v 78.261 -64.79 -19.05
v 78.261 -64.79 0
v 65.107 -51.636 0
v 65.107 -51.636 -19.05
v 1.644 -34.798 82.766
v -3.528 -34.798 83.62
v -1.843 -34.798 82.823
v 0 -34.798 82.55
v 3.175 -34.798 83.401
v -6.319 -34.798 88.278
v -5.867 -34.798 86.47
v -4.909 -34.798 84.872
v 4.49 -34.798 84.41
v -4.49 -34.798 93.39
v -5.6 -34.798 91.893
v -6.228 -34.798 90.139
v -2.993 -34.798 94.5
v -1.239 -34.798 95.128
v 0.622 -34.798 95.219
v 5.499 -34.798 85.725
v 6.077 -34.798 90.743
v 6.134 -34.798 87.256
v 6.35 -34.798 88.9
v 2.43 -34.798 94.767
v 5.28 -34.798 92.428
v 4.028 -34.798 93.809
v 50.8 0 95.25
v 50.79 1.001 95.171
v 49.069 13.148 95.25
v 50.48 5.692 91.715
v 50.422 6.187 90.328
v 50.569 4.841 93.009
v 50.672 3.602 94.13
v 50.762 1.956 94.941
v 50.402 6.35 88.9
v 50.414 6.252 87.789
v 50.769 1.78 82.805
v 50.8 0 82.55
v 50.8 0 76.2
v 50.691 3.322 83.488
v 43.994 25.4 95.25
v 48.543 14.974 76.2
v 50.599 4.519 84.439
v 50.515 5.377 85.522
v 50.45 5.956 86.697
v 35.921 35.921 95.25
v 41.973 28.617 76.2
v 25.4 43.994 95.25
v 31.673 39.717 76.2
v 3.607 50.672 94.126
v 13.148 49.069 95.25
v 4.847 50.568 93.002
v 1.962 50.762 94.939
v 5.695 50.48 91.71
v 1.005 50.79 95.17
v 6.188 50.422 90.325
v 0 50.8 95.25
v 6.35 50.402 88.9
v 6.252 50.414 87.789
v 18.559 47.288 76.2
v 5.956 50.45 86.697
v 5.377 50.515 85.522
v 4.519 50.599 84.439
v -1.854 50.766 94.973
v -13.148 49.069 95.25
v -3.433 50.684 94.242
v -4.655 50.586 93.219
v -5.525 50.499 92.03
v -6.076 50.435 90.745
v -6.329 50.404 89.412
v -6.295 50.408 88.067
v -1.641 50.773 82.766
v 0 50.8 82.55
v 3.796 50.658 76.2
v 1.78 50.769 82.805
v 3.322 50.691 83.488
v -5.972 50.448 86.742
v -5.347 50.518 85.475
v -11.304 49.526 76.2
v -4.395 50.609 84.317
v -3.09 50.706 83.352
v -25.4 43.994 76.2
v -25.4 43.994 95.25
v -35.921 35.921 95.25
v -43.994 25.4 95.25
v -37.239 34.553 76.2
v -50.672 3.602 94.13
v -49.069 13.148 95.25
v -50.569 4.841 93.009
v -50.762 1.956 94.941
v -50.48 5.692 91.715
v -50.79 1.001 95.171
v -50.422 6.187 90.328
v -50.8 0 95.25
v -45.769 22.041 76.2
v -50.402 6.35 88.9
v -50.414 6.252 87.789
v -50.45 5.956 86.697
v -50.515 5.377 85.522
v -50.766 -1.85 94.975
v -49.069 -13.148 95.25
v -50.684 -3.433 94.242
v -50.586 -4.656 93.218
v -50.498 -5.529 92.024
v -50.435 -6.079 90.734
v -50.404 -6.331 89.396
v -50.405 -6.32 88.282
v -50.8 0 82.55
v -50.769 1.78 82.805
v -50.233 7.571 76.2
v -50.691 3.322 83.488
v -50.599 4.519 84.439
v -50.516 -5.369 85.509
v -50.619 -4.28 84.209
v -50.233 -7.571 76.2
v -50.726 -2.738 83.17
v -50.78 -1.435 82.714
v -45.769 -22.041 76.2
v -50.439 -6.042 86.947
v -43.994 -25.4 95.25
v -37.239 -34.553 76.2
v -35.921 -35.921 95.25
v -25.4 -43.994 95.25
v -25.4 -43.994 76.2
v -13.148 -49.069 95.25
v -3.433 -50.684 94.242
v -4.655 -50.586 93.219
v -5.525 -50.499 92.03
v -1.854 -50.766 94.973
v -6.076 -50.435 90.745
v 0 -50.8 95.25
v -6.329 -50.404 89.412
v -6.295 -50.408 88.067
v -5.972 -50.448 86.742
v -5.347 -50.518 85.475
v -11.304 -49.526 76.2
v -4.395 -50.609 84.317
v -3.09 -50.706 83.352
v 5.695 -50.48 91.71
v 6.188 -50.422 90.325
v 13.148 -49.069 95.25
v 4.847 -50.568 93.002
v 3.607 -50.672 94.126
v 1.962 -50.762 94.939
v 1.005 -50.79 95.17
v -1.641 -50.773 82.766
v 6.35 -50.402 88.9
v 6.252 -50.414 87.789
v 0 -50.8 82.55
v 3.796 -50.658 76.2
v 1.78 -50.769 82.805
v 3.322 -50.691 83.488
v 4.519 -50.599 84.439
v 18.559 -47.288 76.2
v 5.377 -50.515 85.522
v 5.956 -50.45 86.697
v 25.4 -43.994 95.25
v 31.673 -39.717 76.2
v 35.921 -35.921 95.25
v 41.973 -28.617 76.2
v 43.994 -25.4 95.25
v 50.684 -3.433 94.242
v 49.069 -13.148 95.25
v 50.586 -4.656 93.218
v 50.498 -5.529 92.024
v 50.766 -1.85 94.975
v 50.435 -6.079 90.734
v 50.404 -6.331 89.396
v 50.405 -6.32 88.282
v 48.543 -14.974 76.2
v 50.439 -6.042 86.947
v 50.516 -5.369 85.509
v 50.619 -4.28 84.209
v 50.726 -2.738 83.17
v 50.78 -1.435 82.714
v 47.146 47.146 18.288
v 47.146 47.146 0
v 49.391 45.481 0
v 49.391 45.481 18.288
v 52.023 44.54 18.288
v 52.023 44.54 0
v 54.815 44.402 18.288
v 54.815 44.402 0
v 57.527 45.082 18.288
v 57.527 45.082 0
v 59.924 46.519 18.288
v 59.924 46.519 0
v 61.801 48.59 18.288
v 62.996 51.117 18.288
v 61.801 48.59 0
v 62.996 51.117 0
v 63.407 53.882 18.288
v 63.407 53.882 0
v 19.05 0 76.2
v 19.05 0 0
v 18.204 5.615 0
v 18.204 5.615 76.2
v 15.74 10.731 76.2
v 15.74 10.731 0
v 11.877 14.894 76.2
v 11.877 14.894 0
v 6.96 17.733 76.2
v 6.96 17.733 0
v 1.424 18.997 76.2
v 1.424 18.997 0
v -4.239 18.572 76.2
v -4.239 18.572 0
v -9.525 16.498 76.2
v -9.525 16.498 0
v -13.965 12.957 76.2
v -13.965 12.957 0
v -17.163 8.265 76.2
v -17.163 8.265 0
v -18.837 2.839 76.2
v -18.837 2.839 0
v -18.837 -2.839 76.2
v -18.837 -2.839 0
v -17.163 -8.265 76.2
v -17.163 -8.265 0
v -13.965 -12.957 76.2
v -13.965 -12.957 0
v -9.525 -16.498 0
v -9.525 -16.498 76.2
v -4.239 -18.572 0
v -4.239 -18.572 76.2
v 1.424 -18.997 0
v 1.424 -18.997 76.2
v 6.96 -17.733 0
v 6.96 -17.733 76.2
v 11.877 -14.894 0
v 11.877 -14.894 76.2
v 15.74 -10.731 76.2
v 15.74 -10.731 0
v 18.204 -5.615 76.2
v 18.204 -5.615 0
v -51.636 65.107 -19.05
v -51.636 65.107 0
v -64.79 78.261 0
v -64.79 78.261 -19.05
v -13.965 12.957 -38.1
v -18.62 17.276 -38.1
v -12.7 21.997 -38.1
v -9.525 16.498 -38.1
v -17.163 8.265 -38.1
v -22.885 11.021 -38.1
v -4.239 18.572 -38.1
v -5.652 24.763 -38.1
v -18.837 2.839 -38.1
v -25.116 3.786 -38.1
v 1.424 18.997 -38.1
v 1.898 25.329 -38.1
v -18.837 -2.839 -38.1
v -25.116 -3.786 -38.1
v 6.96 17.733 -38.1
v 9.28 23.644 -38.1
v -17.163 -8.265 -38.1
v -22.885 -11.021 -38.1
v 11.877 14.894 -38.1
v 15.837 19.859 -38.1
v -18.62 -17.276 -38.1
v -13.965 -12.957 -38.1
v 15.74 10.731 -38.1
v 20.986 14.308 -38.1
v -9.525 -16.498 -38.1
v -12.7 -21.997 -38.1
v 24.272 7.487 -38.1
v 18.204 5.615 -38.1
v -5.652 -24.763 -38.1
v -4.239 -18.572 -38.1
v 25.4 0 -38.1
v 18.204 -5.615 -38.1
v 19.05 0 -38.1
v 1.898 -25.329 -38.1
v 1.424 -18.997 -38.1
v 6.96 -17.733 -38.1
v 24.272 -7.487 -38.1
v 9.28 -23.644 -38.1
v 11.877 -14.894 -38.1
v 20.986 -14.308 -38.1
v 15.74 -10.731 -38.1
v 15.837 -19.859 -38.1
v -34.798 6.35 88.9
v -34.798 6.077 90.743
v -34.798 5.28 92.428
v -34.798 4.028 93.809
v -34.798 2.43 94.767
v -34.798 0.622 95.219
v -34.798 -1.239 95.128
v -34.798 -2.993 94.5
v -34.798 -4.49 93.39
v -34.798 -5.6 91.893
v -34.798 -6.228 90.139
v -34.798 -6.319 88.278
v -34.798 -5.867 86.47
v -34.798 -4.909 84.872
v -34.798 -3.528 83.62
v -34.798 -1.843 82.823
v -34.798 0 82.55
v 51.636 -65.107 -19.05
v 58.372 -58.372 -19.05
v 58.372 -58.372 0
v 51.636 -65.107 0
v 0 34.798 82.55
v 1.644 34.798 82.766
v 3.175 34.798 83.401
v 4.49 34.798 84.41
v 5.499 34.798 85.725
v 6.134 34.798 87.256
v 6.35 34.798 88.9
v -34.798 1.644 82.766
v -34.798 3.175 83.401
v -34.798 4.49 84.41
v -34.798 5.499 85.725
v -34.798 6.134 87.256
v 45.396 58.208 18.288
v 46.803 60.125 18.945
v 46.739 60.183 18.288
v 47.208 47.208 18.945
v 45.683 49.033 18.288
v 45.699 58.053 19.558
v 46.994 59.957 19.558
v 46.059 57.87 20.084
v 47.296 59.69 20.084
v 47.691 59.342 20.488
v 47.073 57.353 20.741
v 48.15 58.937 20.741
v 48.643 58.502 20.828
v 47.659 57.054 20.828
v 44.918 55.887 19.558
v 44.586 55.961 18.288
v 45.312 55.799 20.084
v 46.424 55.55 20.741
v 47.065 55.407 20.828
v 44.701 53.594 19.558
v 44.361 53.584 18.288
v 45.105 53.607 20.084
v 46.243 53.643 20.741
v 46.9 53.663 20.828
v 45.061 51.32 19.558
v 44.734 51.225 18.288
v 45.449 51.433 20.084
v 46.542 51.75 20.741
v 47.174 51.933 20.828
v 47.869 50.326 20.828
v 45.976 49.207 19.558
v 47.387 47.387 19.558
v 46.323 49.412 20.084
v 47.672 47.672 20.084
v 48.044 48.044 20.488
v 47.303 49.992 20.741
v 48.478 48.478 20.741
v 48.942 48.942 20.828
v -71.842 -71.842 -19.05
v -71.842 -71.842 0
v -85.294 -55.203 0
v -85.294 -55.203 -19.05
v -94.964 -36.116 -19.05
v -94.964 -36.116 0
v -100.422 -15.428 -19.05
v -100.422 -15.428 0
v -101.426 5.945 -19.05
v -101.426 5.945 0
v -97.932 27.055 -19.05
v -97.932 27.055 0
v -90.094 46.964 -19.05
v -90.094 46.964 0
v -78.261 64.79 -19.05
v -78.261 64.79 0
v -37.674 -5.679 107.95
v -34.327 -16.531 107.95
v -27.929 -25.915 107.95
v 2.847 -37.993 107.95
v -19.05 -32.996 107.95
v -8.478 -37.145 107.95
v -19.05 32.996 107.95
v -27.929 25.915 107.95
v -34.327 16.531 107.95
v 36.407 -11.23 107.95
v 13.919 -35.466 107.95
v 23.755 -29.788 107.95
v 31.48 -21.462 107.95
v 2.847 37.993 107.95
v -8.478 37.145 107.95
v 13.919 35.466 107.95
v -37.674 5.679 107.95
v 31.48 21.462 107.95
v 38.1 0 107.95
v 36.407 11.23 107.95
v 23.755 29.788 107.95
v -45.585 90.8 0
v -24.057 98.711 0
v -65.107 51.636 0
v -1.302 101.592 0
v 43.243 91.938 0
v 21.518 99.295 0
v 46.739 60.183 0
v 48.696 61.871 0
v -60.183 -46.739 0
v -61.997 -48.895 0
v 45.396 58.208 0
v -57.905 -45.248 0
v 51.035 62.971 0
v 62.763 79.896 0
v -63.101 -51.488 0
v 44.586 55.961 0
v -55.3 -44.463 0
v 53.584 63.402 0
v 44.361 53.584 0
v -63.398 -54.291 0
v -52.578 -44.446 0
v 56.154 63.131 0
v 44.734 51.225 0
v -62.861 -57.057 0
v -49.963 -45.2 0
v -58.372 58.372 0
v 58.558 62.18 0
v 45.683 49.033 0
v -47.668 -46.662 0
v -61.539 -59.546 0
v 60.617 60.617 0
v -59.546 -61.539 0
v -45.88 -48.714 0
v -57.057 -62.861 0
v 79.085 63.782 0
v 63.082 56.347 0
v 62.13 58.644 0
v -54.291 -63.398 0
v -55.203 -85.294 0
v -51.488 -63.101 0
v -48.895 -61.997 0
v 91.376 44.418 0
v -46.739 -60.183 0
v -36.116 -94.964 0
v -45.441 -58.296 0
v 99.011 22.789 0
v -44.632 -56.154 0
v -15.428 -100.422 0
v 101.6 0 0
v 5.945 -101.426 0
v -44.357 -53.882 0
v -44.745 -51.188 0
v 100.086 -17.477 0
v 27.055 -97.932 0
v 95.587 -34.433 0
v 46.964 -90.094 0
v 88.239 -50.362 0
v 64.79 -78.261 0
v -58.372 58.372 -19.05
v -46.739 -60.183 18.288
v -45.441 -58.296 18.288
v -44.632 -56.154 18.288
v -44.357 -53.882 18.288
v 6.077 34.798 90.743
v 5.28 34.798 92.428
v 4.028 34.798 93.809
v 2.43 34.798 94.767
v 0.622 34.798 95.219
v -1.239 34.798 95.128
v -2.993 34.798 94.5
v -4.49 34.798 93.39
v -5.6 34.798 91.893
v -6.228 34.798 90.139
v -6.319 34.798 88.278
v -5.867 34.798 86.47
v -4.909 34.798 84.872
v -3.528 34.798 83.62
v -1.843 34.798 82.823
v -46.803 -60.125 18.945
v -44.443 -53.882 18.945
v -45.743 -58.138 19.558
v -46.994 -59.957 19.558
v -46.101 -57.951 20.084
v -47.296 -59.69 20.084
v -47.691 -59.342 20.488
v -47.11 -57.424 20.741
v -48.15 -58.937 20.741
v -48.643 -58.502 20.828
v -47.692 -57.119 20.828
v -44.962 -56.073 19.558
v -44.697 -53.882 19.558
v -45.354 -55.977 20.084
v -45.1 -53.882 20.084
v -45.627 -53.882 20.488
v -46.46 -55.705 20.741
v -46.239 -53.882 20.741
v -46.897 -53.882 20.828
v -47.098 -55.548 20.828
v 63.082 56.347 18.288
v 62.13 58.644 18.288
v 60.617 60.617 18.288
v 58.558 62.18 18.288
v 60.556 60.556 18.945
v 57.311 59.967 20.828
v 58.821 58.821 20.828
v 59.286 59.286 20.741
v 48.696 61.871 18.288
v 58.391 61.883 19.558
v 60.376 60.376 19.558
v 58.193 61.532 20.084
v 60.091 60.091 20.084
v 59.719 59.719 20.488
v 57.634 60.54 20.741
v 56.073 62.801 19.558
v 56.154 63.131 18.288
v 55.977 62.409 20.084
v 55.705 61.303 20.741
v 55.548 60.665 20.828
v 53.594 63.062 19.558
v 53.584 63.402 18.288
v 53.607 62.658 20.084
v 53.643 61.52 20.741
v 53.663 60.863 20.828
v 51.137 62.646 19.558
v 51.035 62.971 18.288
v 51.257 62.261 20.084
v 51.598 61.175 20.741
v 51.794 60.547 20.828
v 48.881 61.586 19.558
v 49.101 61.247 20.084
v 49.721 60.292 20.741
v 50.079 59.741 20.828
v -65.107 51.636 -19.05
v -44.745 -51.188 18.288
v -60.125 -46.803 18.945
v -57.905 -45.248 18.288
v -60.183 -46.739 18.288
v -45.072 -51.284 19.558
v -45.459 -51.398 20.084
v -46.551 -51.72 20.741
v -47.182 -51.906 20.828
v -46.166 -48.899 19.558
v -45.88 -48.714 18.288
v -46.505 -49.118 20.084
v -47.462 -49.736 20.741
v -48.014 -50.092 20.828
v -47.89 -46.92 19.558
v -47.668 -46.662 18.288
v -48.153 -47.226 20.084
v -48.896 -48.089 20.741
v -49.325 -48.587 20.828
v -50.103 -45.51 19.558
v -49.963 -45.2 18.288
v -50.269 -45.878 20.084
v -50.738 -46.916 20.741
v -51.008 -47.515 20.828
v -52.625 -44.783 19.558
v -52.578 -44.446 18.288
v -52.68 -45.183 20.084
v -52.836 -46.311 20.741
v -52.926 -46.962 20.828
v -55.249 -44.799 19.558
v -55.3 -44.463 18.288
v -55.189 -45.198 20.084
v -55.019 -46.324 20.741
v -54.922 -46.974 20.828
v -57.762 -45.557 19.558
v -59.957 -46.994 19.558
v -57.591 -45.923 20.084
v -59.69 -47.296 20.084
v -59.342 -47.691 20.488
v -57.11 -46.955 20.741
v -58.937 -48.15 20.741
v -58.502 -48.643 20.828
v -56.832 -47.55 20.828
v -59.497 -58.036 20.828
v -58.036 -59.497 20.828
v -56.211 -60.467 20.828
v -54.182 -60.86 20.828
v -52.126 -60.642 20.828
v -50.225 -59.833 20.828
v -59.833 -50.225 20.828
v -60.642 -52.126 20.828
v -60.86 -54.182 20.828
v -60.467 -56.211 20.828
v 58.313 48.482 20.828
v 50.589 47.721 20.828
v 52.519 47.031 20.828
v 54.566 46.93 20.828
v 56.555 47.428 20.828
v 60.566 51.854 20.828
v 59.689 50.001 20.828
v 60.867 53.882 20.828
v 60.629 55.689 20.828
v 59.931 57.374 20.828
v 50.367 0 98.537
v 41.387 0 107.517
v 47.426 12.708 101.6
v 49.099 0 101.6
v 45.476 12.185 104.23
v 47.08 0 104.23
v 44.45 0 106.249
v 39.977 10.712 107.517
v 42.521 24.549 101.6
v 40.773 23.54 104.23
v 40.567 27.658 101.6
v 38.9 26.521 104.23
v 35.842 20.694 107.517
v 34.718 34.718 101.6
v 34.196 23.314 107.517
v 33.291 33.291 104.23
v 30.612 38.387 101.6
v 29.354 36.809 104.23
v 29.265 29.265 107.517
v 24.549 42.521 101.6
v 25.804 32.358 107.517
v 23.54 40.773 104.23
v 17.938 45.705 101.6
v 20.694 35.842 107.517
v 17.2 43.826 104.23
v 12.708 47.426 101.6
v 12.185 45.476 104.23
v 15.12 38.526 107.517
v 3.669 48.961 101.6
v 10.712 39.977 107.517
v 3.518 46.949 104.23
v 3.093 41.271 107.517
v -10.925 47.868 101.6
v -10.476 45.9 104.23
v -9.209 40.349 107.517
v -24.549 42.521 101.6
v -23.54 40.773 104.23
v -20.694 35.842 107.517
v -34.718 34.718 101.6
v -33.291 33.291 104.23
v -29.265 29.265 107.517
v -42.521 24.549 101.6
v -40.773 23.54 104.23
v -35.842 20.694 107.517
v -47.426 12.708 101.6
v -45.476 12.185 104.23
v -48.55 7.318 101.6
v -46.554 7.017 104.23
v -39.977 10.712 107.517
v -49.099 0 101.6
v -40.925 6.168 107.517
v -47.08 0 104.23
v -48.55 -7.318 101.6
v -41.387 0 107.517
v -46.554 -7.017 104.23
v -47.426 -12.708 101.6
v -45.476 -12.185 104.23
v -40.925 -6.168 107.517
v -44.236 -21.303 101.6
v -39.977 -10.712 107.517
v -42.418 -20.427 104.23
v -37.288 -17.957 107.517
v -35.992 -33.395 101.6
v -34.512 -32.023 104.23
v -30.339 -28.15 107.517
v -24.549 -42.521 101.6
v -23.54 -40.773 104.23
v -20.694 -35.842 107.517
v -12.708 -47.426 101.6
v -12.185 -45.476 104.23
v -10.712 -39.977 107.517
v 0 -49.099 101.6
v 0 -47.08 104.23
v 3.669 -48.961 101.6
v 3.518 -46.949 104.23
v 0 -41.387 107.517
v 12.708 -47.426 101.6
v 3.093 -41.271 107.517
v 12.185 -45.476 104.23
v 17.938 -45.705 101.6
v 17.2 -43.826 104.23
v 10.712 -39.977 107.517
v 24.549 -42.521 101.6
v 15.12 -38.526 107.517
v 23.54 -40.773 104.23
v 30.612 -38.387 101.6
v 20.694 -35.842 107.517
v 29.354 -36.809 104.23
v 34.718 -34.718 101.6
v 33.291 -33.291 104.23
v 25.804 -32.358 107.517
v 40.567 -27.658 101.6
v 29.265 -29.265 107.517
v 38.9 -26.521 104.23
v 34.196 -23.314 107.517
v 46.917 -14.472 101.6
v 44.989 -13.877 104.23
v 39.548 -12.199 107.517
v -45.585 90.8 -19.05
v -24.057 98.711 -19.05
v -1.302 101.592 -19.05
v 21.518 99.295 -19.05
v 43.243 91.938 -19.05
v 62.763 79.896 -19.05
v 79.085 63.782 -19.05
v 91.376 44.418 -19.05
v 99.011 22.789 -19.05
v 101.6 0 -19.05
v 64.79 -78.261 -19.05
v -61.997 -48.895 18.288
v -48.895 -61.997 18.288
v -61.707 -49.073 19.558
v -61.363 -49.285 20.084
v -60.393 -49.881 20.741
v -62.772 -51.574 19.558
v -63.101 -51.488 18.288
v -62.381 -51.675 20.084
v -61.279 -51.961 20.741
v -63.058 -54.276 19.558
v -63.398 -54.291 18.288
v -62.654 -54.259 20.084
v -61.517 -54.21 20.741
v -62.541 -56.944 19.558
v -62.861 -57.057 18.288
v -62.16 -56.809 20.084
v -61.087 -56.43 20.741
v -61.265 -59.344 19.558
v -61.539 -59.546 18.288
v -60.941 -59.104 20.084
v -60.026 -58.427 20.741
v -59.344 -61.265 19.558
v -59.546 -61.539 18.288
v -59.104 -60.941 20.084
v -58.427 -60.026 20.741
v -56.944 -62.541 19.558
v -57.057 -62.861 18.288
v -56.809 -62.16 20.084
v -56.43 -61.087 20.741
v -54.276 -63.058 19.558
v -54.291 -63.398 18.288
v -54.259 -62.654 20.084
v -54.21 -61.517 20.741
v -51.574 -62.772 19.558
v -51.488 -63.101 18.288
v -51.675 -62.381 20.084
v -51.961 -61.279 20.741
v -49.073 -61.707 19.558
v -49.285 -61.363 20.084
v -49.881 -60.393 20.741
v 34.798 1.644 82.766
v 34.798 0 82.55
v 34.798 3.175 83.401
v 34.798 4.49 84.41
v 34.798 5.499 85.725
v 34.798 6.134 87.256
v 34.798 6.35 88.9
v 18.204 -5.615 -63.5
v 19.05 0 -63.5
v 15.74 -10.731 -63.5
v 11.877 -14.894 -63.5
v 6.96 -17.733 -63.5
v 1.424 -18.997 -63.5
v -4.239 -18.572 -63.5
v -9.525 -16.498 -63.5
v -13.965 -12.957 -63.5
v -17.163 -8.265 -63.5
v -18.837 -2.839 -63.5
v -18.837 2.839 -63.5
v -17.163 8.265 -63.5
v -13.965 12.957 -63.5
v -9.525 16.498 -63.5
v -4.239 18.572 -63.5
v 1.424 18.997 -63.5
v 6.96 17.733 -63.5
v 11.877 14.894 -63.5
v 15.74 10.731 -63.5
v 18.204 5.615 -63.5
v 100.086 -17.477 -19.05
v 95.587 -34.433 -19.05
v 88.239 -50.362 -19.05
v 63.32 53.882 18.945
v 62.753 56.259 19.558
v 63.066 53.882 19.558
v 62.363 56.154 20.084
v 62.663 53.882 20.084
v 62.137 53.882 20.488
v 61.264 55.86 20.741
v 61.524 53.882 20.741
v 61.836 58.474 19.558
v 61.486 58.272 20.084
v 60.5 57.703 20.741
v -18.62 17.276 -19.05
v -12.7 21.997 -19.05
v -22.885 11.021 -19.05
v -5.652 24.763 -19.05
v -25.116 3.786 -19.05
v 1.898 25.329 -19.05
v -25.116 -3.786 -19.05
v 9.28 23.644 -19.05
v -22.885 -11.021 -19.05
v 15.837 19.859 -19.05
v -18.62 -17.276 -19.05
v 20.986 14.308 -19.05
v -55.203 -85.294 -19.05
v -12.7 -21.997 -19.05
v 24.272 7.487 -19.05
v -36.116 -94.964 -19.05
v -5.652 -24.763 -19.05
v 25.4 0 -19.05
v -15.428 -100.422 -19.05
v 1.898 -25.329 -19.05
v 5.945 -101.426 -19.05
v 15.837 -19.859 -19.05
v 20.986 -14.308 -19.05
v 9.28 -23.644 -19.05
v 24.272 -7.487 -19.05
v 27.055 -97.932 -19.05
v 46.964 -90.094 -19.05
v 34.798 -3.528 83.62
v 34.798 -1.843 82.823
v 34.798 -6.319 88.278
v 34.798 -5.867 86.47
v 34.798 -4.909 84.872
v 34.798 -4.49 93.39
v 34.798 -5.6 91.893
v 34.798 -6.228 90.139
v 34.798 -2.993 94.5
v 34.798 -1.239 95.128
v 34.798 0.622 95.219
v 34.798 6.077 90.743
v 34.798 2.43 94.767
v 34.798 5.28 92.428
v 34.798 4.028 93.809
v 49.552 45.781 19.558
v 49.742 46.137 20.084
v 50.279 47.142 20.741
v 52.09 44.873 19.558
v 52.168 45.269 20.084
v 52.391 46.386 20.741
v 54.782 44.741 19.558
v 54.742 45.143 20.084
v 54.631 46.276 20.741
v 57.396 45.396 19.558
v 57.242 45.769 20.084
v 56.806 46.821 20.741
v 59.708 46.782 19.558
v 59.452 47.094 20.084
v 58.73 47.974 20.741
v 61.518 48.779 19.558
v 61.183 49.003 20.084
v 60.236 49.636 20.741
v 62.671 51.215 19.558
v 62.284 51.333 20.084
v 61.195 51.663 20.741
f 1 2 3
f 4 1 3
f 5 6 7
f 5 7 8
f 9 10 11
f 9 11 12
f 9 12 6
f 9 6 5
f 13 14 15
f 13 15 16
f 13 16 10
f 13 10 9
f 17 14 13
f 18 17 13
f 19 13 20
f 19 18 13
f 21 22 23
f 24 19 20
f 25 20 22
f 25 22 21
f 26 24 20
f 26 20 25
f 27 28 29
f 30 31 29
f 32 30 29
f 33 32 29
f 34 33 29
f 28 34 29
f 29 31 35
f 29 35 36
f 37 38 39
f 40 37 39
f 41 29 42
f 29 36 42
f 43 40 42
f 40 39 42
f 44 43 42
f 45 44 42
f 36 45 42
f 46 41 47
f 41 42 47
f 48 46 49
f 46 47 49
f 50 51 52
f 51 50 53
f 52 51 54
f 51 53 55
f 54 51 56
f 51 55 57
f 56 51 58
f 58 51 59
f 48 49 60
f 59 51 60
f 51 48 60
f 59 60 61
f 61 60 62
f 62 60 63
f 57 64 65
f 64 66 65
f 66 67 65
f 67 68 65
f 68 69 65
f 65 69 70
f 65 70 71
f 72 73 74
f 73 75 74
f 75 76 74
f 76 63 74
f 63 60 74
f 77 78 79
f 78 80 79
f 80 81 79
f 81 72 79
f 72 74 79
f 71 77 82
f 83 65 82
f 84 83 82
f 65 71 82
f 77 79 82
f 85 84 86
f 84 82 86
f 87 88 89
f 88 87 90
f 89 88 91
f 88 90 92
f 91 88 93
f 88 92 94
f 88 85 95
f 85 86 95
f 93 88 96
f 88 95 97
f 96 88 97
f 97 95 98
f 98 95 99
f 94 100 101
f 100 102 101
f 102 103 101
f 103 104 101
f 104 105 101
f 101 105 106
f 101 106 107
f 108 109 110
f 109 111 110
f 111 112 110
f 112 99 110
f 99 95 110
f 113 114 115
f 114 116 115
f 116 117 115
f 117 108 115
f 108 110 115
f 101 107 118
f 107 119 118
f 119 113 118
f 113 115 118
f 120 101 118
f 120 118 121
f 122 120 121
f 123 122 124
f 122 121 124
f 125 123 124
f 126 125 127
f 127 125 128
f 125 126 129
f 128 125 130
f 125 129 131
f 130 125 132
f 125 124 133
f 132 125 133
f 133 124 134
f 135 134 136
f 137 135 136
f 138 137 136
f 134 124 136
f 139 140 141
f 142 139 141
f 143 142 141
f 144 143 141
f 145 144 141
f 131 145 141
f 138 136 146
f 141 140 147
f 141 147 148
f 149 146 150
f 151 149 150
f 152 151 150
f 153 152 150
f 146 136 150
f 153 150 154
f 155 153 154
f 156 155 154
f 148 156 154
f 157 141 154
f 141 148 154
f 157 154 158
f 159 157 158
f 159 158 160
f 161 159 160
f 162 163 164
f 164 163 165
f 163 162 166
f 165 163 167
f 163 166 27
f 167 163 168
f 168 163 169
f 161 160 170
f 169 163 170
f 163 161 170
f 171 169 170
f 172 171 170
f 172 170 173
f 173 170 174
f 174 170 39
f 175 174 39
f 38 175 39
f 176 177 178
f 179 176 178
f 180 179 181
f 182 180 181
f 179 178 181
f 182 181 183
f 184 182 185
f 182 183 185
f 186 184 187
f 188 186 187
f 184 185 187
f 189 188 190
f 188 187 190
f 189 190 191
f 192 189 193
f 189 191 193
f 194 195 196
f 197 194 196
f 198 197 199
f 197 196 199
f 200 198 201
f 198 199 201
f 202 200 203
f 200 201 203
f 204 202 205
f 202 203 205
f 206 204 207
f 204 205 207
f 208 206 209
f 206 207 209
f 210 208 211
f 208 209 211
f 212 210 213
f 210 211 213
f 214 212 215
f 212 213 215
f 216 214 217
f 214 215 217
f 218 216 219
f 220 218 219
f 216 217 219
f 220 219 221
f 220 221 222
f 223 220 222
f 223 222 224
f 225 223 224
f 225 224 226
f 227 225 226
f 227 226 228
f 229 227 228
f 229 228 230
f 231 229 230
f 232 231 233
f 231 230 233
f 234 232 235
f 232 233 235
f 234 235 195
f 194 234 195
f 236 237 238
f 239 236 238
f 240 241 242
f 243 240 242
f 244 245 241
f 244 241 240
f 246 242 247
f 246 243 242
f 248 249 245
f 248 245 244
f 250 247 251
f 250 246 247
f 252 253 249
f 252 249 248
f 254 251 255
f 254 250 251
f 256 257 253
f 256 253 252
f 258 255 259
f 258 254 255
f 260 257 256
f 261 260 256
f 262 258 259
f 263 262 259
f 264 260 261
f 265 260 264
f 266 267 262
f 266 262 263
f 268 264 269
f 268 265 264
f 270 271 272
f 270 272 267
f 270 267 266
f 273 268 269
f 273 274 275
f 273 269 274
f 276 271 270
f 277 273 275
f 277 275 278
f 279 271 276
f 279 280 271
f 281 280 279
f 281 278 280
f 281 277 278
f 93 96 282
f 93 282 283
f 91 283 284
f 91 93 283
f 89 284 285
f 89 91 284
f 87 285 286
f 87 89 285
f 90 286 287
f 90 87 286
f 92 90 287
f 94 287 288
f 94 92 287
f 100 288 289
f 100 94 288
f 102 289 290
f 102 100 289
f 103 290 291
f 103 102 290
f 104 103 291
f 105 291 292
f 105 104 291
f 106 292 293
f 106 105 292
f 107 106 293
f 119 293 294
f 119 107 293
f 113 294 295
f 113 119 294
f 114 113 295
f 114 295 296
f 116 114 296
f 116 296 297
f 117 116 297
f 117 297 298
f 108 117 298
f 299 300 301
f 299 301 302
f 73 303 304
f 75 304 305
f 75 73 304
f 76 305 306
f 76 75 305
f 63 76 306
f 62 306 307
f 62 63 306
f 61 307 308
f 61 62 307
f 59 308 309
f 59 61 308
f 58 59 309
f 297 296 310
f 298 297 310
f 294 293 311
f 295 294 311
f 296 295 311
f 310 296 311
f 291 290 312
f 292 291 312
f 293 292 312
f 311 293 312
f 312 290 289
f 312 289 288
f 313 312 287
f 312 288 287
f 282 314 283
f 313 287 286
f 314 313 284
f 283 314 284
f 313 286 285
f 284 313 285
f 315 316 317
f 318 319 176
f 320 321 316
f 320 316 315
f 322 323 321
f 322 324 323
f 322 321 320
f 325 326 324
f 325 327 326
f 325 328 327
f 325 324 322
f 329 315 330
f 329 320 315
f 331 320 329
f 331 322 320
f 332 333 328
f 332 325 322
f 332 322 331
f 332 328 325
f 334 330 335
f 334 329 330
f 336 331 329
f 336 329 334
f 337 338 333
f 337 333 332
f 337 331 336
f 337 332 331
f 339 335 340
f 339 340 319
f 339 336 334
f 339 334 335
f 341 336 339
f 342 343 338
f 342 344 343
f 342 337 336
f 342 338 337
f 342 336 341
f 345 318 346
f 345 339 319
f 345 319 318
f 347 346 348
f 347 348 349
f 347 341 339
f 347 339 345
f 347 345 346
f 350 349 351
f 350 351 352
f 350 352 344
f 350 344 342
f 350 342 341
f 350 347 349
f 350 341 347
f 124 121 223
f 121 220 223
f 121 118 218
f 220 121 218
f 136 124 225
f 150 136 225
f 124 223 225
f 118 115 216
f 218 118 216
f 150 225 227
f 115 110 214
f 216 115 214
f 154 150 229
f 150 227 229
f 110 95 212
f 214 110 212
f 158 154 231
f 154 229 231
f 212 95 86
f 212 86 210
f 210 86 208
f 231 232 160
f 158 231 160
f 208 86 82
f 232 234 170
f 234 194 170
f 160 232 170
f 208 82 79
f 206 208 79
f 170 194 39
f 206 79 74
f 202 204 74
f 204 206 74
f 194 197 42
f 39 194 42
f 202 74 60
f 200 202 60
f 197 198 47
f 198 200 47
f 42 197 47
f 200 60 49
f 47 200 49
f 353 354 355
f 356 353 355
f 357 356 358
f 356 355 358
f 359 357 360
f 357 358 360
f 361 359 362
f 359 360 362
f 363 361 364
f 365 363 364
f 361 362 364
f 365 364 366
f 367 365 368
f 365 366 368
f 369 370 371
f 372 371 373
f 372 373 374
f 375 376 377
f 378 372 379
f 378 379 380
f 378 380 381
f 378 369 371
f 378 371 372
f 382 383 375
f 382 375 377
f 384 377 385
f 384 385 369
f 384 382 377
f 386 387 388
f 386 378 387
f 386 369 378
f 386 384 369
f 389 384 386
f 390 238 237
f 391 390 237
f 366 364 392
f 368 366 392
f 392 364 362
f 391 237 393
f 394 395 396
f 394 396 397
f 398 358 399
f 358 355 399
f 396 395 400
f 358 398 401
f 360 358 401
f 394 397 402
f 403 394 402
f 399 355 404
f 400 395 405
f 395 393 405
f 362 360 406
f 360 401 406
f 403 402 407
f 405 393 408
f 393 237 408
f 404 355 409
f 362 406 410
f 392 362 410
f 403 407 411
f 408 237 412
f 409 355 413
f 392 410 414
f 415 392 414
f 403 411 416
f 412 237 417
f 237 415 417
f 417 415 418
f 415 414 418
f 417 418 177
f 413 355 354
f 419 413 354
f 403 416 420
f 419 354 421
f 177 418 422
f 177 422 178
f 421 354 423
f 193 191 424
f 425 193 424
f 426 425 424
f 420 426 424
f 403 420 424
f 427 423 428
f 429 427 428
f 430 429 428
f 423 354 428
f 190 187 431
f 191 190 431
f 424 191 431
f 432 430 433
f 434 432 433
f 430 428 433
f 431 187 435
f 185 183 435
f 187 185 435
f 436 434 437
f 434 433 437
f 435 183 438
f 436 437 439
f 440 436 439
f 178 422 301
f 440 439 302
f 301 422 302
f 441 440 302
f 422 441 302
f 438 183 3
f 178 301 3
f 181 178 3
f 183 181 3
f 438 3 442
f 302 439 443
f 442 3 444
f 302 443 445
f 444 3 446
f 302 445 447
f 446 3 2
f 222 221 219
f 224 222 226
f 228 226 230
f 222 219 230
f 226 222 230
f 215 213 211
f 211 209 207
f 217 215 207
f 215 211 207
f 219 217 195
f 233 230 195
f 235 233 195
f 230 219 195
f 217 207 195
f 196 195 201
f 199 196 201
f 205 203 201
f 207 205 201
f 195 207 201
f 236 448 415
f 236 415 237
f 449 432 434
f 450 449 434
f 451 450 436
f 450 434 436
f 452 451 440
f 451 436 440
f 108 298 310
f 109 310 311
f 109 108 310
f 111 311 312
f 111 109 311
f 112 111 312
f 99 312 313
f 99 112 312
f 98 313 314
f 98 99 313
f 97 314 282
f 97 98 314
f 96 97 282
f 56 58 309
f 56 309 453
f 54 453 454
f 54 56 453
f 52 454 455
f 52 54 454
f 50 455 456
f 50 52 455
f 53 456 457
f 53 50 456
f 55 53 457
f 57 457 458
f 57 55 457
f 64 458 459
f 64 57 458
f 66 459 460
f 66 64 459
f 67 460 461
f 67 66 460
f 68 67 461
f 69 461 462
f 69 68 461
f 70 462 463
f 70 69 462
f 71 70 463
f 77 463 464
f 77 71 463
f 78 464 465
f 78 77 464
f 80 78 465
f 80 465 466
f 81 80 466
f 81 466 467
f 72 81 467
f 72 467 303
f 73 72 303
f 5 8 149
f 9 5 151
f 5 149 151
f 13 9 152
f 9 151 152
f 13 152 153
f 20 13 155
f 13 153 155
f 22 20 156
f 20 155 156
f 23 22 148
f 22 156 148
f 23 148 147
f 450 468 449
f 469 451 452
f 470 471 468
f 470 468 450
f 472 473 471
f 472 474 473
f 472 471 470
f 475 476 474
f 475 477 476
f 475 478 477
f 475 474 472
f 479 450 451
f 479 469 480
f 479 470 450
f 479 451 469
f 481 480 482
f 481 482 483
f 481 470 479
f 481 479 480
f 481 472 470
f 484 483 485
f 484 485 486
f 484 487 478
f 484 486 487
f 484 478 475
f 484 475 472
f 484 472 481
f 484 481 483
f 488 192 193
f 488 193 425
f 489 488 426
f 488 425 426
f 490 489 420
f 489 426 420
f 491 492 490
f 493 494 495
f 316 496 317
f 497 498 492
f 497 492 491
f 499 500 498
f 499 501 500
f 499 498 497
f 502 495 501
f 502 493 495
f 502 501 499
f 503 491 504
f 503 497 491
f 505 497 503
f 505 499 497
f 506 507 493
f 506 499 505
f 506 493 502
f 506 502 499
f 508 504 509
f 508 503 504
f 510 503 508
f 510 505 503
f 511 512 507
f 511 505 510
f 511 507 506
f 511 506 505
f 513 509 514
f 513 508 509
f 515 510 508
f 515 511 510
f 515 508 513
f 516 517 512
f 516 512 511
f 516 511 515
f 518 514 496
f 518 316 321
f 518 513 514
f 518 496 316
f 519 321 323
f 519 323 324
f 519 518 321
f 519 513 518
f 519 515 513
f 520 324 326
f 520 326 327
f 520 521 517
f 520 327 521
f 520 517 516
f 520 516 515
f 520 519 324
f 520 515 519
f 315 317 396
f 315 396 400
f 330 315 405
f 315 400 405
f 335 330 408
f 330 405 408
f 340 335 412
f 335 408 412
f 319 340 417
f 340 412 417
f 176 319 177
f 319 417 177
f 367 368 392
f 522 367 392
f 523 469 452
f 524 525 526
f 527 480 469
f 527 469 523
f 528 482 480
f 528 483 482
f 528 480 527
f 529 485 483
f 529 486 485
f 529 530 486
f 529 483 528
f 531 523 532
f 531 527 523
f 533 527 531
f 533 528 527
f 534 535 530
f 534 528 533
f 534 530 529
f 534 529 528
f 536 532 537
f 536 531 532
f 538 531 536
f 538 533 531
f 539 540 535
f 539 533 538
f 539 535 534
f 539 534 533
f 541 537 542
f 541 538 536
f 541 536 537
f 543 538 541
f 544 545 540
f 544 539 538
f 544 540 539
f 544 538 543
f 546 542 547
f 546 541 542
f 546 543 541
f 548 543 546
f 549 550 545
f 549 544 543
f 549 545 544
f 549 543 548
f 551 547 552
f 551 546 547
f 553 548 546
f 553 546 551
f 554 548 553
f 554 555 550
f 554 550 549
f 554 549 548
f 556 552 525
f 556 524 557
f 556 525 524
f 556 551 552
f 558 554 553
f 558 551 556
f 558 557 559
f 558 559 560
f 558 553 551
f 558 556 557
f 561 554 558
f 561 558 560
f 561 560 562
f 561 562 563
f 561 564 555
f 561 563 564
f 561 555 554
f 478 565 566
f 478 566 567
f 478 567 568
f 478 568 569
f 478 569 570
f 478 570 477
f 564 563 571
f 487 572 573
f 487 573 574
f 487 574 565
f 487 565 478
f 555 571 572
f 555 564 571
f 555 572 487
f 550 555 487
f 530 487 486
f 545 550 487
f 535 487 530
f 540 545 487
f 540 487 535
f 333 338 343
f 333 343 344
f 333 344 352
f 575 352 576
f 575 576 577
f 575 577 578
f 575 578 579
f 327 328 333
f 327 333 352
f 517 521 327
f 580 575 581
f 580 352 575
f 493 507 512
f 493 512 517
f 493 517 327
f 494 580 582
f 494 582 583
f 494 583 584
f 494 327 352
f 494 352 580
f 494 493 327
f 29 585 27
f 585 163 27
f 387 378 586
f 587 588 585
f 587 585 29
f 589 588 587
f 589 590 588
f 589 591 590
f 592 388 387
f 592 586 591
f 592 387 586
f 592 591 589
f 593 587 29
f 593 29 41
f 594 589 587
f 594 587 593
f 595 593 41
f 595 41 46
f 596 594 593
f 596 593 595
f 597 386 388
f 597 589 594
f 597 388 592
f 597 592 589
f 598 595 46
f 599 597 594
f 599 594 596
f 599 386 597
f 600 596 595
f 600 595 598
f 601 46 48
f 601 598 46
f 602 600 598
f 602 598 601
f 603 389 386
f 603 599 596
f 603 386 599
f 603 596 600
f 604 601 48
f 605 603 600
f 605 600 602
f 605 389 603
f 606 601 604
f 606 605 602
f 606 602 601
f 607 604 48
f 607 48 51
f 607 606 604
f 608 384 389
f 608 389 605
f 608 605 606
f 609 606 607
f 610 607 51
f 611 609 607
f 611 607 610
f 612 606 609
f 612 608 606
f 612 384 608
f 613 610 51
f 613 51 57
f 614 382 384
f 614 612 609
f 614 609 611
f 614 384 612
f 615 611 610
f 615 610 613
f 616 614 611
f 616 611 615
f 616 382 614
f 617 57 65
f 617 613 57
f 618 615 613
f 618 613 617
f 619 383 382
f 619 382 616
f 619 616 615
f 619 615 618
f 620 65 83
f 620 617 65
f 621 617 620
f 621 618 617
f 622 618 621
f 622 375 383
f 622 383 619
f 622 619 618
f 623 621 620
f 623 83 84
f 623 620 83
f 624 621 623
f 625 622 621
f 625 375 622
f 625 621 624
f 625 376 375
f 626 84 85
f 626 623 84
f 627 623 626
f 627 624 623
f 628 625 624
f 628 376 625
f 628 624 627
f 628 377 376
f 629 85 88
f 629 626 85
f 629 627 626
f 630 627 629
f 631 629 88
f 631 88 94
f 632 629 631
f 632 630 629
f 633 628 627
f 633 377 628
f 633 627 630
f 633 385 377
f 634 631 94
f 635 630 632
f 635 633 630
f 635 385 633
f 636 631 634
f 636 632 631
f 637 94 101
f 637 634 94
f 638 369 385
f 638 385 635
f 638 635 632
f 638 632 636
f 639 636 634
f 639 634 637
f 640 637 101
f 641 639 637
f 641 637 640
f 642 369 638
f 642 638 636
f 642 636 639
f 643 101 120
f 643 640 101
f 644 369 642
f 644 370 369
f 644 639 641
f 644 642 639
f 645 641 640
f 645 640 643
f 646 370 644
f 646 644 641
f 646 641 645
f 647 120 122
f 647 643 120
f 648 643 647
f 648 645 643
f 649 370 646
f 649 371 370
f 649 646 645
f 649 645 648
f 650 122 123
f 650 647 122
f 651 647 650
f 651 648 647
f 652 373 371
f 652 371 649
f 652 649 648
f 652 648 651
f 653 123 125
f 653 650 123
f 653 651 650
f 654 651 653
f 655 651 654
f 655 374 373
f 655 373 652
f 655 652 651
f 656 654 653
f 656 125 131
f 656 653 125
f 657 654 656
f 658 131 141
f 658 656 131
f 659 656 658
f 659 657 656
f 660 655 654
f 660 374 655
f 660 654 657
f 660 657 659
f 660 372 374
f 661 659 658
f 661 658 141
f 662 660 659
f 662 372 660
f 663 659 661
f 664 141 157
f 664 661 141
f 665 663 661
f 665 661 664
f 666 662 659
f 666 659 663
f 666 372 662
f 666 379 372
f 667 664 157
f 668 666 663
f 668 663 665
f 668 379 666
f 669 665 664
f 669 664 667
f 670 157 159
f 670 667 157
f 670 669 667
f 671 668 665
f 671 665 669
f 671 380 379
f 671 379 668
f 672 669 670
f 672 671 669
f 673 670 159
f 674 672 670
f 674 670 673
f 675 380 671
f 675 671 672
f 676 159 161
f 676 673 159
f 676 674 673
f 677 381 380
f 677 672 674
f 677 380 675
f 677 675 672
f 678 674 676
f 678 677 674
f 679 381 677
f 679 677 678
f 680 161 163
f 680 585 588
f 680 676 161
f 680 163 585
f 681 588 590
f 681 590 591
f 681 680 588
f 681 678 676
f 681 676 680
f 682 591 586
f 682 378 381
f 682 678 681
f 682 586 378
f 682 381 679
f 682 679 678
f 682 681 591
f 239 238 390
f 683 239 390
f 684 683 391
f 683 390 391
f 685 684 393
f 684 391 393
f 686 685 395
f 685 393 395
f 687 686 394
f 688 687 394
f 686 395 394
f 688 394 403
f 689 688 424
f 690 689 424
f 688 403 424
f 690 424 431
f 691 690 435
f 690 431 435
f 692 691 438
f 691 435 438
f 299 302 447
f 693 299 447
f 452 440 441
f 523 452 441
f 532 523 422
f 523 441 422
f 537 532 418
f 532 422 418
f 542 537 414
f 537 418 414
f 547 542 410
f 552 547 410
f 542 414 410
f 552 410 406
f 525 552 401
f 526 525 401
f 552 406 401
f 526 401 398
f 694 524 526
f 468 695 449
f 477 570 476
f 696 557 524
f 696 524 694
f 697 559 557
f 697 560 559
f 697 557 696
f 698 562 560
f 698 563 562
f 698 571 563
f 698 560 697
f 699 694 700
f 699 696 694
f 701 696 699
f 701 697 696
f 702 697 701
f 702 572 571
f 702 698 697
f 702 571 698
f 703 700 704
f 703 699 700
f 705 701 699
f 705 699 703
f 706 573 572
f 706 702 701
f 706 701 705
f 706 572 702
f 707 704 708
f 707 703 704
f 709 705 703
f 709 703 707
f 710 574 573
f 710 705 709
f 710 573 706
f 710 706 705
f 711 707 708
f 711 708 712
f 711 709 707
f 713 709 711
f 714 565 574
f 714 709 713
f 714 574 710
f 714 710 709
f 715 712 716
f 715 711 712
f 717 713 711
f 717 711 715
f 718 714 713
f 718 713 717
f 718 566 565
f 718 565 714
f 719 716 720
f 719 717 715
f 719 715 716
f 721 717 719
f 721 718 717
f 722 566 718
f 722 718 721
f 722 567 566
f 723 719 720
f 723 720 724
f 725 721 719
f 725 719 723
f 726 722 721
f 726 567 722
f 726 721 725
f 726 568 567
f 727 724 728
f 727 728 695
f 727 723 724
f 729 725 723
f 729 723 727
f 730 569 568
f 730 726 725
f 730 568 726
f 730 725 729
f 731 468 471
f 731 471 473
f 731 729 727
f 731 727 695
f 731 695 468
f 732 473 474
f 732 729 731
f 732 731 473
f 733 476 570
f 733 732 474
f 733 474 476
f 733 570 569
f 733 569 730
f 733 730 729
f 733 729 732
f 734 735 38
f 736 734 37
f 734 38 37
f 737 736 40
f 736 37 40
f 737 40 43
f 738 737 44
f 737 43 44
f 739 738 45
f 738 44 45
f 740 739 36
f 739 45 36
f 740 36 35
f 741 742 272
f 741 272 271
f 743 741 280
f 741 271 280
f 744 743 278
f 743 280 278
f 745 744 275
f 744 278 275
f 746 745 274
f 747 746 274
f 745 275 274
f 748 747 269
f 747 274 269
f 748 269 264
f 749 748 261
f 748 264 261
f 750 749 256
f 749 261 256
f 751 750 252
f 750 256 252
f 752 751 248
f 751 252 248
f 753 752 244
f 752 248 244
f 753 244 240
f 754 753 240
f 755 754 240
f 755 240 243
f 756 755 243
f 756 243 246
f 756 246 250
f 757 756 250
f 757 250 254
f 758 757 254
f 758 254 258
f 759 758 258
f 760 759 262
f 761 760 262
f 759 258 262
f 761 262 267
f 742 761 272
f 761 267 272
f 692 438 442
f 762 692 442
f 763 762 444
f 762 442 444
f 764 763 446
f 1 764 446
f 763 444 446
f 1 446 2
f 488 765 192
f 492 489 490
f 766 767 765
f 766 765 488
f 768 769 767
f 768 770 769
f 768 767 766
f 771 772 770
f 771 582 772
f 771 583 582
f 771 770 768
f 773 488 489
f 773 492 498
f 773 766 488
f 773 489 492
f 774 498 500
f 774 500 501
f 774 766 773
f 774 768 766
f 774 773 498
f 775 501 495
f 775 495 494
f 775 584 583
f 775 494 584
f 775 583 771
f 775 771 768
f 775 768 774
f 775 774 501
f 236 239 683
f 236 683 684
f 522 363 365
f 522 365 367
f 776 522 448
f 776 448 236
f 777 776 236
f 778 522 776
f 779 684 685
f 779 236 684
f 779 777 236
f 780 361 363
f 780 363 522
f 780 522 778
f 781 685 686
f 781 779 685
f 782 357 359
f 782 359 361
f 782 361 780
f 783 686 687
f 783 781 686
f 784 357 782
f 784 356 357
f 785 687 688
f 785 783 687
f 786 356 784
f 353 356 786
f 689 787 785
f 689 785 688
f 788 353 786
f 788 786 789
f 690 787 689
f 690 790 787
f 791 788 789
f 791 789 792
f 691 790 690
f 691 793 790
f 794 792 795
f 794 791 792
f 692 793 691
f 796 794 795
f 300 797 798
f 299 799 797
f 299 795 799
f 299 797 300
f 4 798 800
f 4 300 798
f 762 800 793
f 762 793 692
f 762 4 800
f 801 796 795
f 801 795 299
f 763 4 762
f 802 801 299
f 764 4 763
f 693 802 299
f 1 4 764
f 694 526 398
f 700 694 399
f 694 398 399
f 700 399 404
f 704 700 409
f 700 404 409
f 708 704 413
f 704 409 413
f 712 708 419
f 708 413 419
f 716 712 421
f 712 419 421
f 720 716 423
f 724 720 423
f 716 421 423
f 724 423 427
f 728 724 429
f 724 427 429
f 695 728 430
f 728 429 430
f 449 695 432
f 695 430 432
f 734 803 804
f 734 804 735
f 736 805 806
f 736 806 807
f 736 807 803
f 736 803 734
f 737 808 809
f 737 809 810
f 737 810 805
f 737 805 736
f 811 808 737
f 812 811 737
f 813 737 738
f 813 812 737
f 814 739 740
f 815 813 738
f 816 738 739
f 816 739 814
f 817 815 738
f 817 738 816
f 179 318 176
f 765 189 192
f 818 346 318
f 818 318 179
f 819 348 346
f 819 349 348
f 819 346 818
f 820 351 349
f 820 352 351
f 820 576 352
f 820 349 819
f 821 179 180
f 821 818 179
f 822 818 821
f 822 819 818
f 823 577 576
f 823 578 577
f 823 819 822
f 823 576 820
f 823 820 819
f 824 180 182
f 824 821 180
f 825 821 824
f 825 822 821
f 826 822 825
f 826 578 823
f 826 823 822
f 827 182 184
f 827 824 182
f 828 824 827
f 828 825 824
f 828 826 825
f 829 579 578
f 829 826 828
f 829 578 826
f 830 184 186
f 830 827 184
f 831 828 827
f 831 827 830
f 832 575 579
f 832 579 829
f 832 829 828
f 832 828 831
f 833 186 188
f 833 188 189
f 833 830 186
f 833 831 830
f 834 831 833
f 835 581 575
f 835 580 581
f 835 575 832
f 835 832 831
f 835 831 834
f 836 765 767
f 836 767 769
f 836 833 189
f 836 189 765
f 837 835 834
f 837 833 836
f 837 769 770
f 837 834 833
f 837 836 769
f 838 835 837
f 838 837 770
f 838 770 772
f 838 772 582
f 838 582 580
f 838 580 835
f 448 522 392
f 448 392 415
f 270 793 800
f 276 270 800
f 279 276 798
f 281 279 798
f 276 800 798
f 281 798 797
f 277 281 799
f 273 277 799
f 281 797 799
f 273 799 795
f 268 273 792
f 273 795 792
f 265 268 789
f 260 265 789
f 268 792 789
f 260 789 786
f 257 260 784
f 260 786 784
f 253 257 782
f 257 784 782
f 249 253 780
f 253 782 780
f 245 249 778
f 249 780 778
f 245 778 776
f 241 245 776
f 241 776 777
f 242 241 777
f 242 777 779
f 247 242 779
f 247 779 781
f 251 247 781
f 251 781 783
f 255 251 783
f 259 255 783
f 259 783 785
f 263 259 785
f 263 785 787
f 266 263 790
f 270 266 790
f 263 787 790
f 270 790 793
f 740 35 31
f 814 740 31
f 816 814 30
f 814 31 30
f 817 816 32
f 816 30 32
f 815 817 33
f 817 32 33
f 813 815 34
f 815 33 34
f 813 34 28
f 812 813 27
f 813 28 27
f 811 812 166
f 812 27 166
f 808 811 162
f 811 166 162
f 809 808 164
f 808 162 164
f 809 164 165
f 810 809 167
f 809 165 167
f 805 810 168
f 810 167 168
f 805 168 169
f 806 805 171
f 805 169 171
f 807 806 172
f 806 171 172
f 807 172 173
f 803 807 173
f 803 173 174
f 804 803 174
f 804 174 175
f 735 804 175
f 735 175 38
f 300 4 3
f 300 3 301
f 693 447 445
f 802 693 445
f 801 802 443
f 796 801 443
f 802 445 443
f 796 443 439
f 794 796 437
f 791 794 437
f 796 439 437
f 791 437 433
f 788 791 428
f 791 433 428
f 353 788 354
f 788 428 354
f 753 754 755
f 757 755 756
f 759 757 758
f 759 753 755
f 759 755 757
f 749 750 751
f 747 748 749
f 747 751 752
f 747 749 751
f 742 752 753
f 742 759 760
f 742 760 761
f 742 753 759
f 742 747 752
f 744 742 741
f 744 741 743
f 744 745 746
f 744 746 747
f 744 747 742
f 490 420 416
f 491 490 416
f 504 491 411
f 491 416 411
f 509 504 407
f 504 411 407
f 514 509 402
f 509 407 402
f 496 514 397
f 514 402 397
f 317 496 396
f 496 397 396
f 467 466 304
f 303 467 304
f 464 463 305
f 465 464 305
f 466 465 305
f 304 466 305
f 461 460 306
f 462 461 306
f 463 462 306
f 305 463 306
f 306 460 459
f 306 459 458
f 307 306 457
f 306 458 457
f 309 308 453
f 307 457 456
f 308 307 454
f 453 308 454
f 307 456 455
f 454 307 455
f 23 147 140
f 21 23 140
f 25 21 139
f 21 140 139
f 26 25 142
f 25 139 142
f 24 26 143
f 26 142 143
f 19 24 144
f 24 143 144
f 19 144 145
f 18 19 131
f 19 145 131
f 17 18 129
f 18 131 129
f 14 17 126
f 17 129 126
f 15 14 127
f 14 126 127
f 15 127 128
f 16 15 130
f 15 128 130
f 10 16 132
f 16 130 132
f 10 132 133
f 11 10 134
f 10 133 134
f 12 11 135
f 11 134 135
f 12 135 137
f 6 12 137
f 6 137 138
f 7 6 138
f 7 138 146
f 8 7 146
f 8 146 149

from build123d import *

# Parameters (mm, degrees)
F0_R      = 19.05
F1_DEPTH  = 76.2
F2_R      = 50.8
F2_R_2    = 19.05
F3_DEPTH  = 31.75
F4_R      = 12.7
F7_DEPTH  = 16.002
F10_DEPTH = 16.002
F13_DEPTH = 16.002
F16_DEPTH = 16.002
F18_DEPTH = 19.05
F20_DEPTH = 20.828
F21_R     = 2.54
F22_R     = 25.4
F23_DEPTH = 19.05
F24_R     = 19.05
F25_DEPTH = 25.4


with BuildPart() as f1:
    # F0 (on Top) → F1 (new body)
    with BuildSketch(Plane.XY):
        Circle(F0_R)
    extrude(amount=F1_DEPTH)

    # F2 (on face) → F3 (join)
    with BuildSketch(Plane.XY.offset(76.2)):
        Circle(F2_R)
        Circle(F2_R_2, mode=Mode.SUBTRACT)
        Circle(F2_R_2)
    extrude(amount=F3_DEPTH)

    # F4
    f4_edges = [f1.edges().sort_by_distance(p)[0] for p in [
        (-50.8, 0, 107.95),
    ]]
    fillet(f4_edges, radius=F4_R)

    # F6 (on offset) → F7 (cut)
    with BuildSketch(Plane.XZ.offset(50.8)):
        with BuildLine():
            ThreePointArc((0, 82.55), (4.4901280605, 84.4098719395), (6.35, 88.9))
            ThreePointArc((6.35, 88.9), (-4.4901280605, 93.3901280605), (0, 82.55))
        make_face()
    extrude(amount=-F7_DEPTH, mode=Mode.SUBTRACT)

    # F9 (on offset) → F10 (cut)
    with BuildSketch(Plane.YZ.offset(-50.8)):
        with BuildLine():
            ThreePointArc((0, 82.55), (4.4901280605, 84.4098719395), (6.35, 88.9))
            ThreePointArc((6.35, 88.9), (-4.4901280605, 93.3901280605), (0, 82.55))
        make_face()
    extrude(amount=F10_DEPTH, mode=Mode.SUBTRACT)

    # F12 (on offset) → F13 (cut)
    with BuildSketch(Plane.XZ.offset(-50.8)):
        with BuildLine():
            ThreePointArc((0, 82.55), (4.4901280605, 84.4098719395), (6.35, 88.9))
            ThreePointArc((6.35, 88.9), (-4.4901280605, 93.3901280605), (0, 82.55))
        make_face()
    extrude(amount=F13_DEPTH, mode=Mode.SUBTRACT)

    # F15 (on offset) → F16 (cut)
    with BuildSketch(Plane.YZ.offset(50.8)):
        with BuildLine():
            ThreePointArc((0, 82.55), (4.4901280605, 84.4098719395), (6.35, 88.9))
            ThreePointArc((6.35, 88.9), (-4.4901280605, 93.3901280605), (0, 82.55))
        make_face()
    extrude(amount=-F16_DEPTH, mode=Mode.SUBTRACT)


with BuildPart() as f18:
    # F17 (on face) → F18 (new body)
    with BuildSketch(Plane(origin=(0, 0, 0), x_dir=(1, 0, 0), z_dir=(0, 0, -1))):
        with BuildLine():
            Line((19.05, 0), (101.6, 0))
            ThreePointArc((101.6, 0), (95.5872913823, 34.4329744025), (78.2608321613, 64.7904479797))
            Line((78.2608321613, 64.7904479797), (65.1068568778, 51.6364726961))
            Line((65.1068568778, 51.6364726961), (58.3716647869, 58.3716647869))
            Line((58.3716647869, 58.3716647869), (13.4703841816, 13.4703841816))
            ThreePointArc((13.4703841816, 13.4703841816), (17.5999050943, 7.2901193866), (19.05, 0))
        make_face()
        with BuildLine():
            ThreePointArc((-64.7904479797, -78.2608321613), (43.2426322352, -91.9382116281), (101.6, 0))
            Line((101.6, 0), (19.05, 0))
            ThreePointArc((19.05, 0), (0, -19.05), (-19.05, 0))
            Line((-19.05, 0), (-101.6, 0))
            ThreePointArc((-101.6, 0), (-95.5872913823, -34.4329744025), (-78.2608321613, -64.7904479797))
            Line((-78.2608321613, -64.7904479797), (-65.1068568778, -51.6364726961))
            Line((-65.1068568778, -51.6364726961), (-58.3716647869, -58.3716647869))
            Line((-58.3716647869, -58.3716647869), (-51.6364726961, -65.1068568778))
            Line((-51.6364726961, -65.1068568778), (-64.7904479797, -78.2608321613))
        make_face()
        with BuildLine():
            ThreePointArc((-19.05, 0), (0, -19.05), (19.05, 0))
            Line((19.05, 0), (0, 0))
            Line((0, 0), (-19.05, 0))
        make_face()
        with BuildLine():
            Line((0, 0), (19.05, 0))
            ThreePointArc((19.05, 0), (17.5999050943, 7.2901193866), (13.4703841816, 13.4703841816))
            Line((13.4703841816, 13.4703841816), (0, 0))
        make_face()
        with BuildLine():
            Line((-13.4703841816, 13.4703841816), (0, 0))
            Line((0, 0), (0, 19.05))
            ThreePointArc((0, 19.05), (-7.2901193866, 17.5999050943), (-13.4703841816, 13.4703841816))
        make_face()
        with BuildLine():
            Line((0, 19.05), (0, 0))
            Line((0, 0), (13.4703841816, 13.4703841816))
            ThreePointArc((13.4703841816, 13.4703841816), (7.2901193866, 17.5999050943), (0, 19.05))
        make_face()
        with BuildLine():
            Line((-19.05, 0), (0, 0))
            Line((0, 0), (-13.4703841816, 13.4703841816))
            ThreePointArc((-13.4703841816, 13.4703841816), (-17.5999050943, 7.2901193866), (-19.05, 0))
        make_face()
        with BuildLine():
            ThreePointArc((0, 19.05), (7.2901193866, 17.5999050943), (13.4703841816, 13.4703841816))
            Line((13.4703841816, 13.4703841816), (58.3716647869, 58.3716647869))
            Line((58.3716647869, 58.3716647869), (51.6364726961, 65.1068568778))
            Line((51.6364726961, 65.1068568778), (64.7904479797, 78.2608321613))
            ThreePointArc((64.7904479797, 78.2608321613), (34.4329744025, 95.5872913823), (0, 101.6))
            Line((0, 101.6), (0, 19.05))
        make_face()
        with BuildLine():
            Line((-101.6, 0), (-19.05, 0))
            ThreePointArc((-19.05, 0), (-17.5999050943, 7.2901193866), (-13.4703841816, 13.4703841816))
            Line((-13.4703841816, 13.4703841816), (-71.8420489686, 71.8420489686))
            ThreePointArc((-71.8420489686, 71.8420489686), (-93.8661605031, 38.8806367283), (-101.6, 0))
        make_face()
        with BuildLine():
            ThreePointArc((-13.4703841816, 13.4703841816), (-7.2901193866, 17.5999050943), (0, 19.05))
            Line((0, 19.05), (0, 101.6))
            ThreePointArc((0, 101.6), (-38.8806367283, 93.8661605031), (-71.8420489686, 71.8420489686))
            Line((-71.8420489686, 71.8420489686), (-13.4703841816, 13.4703841816))
        make_face()
    extrude(amount=F18_DEPTH)

    # F19 (on face) → F20 (join)
    with BuildSketch(Plane.XY):
        with BuildLine():
            ThreePointArc((-60.182611768, -46.7385626735), (-53.8815367264, -53.8815367264), (-46.7385626735, -60.182611768))
            ThreePointArc((-46.7385626735, -60.182611768), (-44.9719224572, -57.2496814046), (-44.3565367264, -53.8815367264))
            ThreePointArc((-44.3565367264, -53.8815367264), (-49.9631260008, -45.1998501169), (-60.182611768, -46.7385626735))
        make_face()
        with BuildLine():
            ThreePointArc((-60.182611768, -46.7385626735), (-60.6167288172, -60.6167288172), (-46.7385626735, -60.182611768))
            ThreePointArc((-46.7385626735, -60.182611768), (-53.8815367264, -53.8815367264), (-60.182611768, -46.7385626735))
        make_face()
        with BuildLine():
            Line((53.8815367264, 53.8815367264), (47.1463446356, 47.1463446356))
            ThreePointArc((47.1463446356, 47.1463446356), (53.5837348875, 44.3611932943), (60.182611768, 46.7385626735))
            ThreePointArc((60.182611768, 46.7385626735), (57.1437924233, 50.4086003325), (53.8815367264, 53.8815367264))
        make_face()
        with BuildLine():
            ThreePointArc((46.7385626735, 60.182611768), (44.3611932943, 53.5837348875), (47.1463446356, 47.1463446356))
            Line((47.1463446356, 47.1463446356), (53.8815367264, 53.8815367264))
            ThreePointArc((53.8815367264, 53.8815367264), (50.4086003325, 57.1437924233), (46.7385626735, 60.182611768))
        make_face()
        with BuildLine():
            ThreePointArc((60.6167288172, 60.6167288172), (53.5837348875, 63.4018801585), (46.7385626735, 60.182611768))
            ThreePointArc((46.7385626735, 60.182611768), (50.4086003325, 57.1437924233), (53.8815367264, 53.8815367264))
            Line((53.8815367264, 53.8815367264), (60.6167288172, 60.6167288172))
        make_face()
        with BuildLine():
            ThreePointArc((53.8815367264, 53.8815367264), (57.1437924233, 50.4086003325), (60.182611768, 46.7385626735))
            ThreePointArc((60.182611768, 46.7385626735), (62.5632233359, 49.9631260008), (63.4065367264, 53.8815367264))
            ThreePointArc((63.4065367264, 53.8815367264), (62.6814892736, 57.5265964197), (60.6167288172, 60.6167288172))
            Line((60.6167288172, 60.6167288172), (53.8815367264, 53.8815367264))
        make_face()
    extrude(amount=F20_DEPTH)

    # F21
    f21_edges = [f18.edges().sort_by_distance(p)[0] for p in [
        (47.580462, 61.024511, 20.828),
        (-63.406537, -53.881537, 20.828),
    ]]
    fillet(f21_edges, radius=F21_R)

    # F22 (on face) → F23 (join)
    with BuildSketch(Plane(origin=(0, 0, -19.05), x_dir=(1, 0, 0), z_dir=(0, 0, -1))):
        Circle(F22_R)
    extrude(amount=F23_DEPTH)

    # F24 (on face) → F25 (join)
    with BuildSketch(Plane(origin=(0, 0, -38.1), x_dir=(1, 0, 0), z_dir=(0, 0, -1))):
        Circle(F24_R)
    extrude(amount=F25_DEPTH)


solid = Compound([f1.part, f18.part])
